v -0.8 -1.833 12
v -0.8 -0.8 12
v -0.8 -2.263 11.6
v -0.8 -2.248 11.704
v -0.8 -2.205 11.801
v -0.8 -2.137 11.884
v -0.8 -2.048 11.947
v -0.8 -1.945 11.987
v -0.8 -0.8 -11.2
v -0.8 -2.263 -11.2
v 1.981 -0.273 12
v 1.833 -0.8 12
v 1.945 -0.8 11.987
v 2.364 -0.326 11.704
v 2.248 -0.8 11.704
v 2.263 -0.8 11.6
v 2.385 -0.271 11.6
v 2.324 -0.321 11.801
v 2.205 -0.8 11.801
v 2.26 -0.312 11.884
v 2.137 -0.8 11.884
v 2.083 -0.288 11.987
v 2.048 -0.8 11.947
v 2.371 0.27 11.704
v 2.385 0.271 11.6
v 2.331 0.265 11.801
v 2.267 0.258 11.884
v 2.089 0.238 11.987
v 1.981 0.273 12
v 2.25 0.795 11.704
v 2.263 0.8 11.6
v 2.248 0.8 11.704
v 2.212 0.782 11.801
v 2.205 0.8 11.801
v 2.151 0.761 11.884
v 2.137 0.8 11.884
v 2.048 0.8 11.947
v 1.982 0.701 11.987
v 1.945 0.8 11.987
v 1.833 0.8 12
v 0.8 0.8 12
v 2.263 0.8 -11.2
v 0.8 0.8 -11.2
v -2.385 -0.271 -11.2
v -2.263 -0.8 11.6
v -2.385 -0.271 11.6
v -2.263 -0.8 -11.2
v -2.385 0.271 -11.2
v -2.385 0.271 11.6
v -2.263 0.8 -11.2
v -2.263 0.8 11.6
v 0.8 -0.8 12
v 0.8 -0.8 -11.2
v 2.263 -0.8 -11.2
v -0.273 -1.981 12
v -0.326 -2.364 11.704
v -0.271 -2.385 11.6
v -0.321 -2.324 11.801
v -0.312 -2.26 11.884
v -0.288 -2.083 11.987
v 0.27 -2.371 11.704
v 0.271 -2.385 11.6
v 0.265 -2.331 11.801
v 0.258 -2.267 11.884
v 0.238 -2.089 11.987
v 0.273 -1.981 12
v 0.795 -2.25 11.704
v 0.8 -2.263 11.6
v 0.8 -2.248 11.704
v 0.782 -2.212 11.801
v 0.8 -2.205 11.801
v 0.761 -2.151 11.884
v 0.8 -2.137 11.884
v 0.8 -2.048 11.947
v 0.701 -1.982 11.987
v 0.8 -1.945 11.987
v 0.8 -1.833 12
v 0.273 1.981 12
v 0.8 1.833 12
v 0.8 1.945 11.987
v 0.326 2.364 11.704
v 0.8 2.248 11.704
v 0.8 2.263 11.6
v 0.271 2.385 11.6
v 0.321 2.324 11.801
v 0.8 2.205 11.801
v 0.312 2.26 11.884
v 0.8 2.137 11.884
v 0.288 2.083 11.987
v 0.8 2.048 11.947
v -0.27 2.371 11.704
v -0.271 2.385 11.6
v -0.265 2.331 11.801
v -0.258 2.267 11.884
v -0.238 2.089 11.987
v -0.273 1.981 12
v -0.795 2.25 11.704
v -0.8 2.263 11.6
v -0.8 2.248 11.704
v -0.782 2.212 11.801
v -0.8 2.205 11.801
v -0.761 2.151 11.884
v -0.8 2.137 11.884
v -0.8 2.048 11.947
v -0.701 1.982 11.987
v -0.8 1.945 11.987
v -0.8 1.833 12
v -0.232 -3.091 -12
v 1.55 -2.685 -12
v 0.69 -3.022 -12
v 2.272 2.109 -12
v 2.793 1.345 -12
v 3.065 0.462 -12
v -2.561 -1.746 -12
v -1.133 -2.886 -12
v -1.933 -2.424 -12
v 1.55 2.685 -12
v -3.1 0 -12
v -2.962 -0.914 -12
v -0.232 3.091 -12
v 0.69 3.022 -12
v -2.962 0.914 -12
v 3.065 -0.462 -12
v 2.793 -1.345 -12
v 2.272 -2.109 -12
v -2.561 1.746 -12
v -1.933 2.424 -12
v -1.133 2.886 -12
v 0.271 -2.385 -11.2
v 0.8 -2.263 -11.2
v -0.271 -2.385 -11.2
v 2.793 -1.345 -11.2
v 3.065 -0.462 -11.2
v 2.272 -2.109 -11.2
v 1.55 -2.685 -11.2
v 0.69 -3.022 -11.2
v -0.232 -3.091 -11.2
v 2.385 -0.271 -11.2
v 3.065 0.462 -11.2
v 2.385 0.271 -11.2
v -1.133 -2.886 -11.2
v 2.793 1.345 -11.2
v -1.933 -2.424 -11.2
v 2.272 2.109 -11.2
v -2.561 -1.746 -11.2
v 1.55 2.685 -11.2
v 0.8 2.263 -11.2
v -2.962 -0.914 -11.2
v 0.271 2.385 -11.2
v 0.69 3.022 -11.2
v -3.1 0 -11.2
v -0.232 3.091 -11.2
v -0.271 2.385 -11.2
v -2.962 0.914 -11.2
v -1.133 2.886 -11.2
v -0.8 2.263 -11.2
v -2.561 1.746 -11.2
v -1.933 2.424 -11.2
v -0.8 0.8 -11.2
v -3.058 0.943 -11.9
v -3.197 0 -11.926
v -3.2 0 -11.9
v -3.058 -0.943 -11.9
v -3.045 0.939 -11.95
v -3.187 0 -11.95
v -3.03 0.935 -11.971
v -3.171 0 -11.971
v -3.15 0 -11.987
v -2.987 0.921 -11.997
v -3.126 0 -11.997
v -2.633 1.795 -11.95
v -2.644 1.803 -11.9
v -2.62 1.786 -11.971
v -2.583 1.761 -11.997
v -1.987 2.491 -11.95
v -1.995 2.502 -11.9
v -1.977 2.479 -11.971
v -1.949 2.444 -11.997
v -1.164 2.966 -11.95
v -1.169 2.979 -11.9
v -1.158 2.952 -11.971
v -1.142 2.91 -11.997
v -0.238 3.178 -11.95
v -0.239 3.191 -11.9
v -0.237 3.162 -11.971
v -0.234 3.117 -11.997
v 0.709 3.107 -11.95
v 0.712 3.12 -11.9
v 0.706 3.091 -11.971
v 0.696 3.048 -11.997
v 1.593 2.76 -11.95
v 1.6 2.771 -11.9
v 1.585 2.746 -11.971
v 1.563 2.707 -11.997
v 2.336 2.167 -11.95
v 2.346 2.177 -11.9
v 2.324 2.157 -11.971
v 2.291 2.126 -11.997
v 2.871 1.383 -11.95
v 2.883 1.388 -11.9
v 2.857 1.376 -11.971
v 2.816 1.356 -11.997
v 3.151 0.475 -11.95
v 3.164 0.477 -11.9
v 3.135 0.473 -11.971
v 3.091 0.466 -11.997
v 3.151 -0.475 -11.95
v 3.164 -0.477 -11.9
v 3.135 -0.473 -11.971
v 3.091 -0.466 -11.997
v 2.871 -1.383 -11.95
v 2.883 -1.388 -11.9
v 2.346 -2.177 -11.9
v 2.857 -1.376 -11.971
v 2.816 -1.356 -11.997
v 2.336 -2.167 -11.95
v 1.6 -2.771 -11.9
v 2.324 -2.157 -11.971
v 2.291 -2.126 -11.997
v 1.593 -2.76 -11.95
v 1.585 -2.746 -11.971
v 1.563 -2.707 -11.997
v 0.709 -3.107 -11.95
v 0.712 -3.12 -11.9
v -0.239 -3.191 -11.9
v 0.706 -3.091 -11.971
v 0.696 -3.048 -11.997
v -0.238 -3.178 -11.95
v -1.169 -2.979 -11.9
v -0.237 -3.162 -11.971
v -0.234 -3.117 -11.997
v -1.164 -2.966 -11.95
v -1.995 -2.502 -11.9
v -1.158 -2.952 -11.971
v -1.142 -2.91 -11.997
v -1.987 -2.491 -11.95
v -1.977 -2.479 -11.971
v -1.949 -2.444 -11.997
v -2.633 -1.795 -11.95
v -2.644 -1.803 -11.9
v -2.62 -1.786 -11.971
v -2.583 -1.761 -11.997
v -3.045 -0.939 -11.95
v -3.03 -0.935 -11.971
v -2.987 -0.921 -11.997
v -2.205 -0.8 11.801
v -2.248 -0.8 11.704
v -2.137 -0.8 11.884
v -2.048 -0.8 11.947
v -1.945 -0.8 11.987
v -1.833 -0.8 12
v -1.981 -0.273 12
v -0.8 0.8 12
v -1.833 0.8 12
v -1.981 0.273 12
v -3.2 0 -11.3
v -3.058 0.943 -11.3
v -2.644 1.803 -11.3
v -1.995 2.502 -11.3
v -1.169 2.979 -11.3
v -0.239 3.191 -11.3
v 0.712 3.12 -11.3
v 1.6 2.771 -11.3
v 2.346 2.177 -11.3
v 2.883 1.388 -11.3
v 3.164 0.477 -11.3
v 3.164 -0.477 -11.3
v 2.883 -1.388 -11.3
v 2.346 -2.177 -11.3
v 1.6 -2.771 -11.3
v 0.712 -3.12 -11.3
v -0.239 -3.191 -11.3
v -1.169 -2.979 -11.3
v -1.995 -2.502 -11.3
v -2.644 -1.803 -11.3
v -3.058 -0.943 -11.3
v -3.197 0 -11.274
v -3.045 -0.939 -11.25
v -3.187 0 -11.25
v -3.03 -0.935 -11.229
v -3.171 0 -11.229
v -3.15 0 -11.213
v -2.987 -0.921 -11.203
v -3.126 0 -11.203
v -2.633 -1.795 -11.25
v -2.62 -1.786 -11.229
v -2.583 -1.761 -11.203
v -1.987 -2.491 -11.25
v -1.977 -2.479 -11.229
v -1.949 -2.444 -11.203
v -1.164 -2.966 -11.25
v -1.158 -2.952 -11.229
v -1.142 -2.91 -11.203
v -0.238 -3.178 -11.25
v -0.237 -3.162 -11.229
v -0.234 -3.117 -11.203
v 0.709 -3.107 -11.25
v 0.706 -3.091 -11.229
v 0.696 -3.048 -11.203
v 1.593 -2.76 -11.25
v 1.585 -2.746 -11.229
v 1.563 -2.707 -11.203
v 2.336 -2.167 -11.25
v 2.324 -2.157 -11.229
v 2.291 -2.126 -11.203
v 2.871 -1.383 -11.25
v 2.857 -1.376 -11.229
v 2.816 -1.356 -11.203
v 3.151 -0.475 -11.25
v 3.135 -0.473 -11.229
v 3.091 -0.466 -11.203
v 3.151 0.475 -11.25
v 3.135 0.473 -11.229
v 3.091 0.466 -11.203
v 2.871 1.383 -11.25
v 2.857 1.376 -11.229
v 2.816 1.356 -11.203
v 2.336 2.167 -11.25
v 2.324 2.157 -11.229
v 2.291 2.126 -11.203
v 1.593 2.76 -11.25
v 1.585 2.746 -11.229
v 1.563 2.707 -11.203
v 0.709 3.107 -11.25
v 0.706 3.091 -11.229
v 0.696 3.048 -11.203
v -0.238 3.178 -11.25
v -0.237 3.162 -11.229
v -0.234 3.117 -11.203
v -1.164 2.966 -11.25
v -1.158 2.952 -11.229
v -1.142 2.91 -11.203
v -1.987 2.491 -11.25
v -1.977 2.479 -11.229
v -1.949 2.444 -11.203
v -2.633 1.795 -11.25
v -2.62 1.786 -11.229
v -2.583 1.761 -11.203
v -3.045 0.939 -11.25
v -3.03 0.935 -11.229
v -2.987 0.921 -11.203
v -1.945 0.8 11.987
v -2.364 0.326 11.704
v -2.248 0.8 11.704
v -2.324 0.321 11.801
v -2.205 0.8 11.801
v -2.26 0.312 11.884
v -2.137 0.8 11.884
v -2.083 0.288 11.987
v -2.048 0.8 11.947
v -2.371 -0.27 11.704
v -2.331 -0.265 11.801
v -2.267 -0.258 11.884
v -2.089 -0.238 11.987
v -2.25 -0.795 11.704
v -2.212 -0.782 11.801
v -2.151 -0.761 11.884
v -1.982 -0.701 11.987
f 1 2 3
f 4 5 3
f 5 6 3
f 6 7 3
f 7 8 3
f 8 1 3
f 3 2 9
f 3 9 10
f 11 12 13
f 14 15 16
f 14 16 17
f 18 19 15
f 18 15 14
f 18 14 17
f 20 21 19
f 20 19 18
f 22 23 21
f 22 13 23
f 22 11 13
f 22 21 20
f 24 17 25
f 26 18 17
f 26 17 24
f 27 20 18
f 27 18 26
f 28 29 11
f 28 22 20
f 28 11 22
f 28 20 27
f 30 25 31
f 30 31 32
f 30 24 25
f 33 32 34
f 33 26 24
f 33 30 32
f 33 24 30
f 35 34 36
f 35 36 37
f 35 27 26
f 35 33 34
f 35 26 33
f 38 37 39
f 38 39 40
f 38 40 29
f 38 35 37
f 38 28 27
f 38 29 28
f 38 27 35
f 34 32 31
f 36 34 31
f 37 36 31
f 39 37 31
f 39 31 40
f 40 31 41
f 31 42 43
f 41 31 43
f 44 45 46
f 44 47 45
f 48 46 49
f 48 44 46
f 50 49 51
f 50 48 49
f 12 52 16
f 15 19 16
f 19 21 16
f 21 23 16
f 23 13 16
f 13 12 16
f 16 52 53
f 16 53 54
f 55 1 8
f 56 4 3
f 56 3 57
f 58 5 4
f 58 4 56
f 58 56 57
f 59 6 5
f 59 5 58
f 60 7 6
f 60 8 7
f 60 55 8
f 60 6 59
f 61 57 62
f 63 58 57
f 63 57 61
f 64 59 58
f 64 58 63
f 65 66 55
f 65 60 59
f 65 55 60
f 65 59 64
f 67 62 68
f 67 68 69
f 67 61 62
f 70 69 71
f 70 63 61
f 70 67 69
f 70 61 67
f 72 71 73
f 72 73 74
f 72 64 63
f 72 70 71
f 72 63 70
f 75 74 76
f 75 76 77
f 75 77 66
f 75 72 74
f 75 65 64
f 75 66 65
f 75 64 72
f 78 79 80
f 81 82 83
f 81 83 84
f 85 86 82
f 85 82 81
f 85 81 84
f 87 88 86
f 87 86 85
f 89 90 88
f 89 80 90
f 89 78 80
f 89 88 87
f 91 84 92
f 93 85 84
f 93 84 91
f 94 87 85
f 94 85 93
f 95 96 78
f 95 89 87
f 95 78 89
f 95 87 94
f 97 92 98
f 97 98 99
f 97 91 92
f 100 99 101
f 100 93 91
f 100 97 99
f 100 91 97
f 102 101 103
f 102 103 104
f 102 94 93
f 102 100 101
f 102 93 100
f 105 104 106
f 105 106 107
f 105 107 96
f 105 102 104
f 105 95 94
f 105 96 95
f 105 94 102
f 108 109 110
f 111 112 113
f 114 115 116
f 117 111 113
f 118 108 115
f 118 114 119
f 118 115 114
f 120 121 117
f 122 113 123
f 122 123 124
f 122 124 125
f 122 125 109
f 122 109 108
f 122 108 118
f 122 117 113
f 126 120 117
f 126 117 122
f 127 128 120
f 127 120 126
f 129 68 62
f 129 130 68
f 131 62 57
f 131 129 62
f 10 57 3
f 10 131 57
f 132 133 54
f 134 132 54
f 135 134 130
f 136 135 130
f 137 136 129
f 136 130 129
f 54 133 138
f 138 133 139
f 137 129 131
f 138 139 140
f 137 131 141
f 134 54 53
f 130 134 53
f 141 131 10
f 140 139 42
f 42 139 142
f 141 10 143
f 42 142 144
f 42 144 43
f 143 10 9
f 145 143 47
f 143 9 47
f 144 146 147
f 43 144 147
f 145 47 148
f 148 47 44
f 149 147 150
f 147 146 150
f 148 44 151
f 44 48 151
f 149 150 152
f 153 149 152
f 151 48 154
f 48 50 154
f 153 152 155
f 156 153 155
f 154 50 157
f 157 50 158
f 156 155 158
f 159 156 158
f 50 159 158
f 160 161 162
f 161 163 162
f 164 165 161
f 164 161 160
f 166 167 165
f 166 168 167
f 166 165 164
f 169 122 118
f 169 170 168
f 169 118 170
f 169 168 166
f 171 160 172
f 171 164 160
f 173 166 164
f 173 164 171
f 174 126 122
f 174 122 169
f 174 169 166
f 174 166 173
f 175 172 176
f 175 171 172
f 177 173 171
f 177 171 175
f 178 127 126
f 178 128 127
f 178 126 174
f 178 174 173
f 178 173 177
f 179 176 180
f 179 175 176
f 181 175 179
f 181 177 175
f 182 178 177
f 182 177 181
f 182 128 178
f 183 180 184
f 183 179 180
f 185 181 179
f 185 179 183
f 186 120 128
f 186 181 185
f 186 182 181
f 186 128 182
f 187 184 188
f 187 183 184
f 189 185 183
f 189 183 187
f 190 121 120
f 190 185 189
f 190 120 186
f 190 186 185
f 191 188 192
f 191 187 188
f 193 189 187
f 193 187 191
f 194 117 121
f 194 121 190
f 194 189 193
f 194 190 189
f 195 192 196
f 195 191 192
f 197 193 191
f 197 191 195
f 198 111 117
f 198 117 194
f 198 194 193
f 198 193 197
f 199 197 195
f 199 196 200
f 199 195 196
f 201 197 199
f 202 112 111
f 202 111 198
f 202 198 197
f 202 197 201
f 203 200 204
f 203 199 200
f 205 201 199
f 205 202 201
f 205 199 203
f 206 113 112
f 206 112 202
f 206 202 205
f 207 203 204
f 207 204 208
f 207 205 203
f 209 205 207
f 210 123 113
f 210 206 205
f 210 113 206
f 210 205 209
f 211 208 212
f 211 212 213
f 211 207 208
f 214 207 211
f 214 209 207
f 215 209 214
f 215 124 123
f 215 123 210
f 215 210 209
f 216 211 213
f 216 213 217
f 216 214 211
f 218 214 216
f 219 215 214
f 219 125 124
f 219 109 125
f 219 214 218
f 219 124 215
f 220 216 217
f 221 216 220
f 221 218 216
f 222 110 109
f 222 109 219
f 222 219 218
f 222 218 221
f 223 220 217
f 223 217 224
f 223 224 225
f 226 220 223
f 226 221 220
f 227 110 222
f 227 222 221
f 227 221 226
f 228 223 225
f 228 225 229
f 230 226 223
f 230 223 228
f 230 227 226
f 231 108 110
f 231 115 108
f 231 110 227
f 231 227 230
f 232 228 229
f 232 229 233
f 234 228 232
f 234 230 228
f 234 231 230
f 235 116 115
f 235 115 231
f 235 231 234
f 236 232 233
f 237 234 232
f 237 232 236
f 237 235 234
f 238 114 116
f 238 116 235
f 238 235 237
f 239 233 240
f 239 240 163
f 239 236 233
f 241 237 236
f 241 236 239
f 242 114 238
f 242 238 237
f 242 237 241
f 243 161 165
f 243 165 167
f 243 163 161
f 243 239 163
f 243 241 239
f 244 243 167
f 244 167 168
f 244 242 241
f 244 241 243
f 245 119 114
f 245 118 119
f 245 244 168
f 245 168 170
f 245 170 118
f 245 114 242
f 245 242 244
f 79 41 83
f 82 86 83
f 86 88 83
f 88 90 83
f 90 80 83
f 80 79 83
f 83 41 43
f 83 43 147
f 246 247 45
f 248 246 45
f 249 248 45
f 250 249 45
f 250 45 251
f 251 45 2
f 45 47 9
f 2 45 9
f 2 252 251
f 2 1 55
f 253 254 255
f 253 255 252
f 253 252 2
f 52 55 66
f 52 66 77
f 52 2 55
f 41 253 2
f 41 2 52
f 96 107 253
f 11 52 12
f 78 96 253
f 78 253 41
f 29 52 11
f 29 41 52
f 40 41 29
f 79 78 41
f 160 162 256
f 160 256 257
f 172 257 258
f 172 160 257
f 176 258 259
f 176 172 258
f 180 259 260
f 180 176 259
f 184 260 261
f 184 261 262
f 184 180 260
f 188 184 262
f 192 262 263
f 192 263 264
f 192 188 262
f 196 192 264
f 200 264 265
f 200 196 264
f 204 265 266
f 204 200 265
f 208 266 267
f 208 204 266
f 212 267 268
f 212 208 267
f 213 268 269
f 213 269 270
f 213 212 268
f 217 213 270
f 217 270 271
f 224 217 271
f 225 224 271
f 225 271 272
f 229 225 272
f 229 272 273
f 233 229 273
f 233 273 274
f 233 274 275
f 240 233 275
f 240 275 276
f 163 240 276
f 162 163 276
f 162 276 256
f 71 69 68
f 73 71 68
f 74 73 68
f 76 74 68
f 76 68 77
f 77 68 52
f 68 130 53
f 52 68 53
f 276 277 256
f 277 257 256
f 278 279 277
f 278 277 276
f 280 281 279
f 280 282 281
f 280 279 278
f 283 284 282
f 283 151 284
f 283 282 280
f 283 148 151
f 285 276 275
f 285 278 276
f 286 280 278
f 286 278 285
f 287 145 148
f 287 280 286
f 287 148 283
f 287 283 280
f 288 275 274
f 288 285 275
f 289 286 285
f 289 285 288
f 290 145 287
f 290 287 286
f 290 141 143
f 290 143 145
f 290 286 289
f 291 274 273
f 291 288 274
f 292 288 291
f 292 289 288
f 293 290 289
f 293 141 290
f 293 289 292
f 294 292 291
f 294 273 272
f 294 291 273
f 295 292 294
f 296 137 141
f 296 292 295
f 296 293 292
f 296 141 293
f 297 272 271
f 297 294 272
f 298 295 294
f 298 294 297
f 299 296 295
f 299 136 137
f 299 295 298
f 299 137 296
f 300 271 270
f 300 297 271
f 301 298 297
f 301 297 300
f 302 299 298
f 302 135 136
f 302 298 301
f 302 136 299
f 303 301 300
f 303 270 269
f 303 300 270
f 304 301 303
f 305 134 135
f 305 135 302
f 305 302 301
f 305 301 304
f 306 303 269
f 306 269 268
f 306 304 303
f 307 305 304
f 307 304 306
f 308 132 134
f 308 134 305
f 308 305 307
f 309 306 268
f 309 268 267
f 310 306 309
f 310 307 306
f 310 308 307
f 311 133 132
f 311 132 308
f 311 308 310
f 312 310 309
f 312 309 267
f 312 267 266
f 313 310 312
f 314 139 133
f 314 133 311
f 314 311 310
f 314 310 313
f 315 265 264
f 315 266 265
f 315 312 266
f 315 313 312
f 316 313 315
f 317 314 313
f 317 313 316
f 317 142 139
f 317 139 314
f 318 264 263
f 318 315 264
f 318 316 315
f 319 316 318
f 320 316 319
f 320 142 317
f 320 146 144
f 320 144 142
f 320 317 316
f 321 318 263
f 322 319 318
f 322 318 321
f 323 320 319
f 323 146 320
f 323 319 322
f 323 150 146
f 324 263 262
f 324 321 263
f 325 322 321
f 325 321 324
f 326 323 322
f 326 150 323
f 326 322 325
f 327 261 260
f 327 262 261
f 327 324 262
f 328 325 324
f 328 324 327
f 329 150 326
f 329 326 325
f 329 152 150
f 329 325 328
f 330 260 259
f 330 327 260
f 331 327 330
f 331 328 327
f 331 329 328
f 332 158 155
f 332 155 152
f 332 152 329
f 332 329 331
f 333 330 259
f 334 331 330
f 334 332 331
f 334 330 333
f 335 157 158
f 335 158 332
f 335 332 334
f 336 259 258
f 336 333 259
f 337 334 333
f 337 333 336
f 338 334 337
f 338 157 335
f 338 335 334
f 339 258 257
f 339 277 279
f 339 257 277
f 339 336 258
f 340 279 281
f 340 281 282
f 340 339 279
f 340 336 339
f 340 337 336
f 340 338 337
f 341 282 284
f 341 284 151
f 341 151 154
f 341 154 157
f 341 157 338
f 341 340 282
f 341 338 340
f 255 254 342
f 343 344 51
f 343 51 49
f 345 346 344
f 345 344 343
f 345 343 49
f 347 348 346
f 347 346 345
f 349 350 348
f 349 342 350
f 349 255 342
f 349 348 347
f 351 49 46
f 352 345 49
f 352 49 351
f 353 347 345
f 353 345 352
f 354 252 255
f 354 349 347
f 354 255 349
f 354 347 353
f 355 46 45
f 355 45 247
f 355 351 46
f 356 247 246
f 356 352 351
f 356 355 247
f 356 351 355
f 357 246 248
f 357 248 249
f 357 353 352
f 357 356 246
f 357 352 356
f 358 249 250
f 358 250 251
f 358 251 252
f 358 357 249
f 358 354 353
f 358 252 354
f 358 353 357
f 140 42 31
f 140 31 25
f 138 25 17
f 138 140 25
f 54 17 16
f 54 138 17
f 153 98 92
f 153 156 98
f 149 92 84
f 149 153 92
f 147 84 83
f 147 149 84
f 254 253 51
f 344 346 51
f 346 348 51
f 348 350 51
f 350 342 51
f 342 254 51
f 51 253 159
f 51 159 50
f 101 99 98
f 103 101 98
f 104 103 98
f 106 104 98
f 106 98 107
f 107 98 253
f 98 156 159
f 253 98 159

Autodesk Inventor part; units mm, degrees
ref_plane "YZ Plane" through (0, 0, 0) normal (1, 0, 0) x (0, 1, 0)
ref_plane "XZ Plane" through (0, 0, 0) normal (0, 1, 0) x (-1, 0, 0)
ref_plane "XY Plane" through (0, 0, 0) normal (0, 0, 1) x (1, 0, 0)
sketch "Sketch1" plane through (0, 0, 0) normal (0, 0, 1) x (1, 0, 0)
  circle A0 centre (0, 0) radius 2.4 construction
  line L0 (-0.8, 2.2627) -> (-0.8, 0.8)
  line L1 (-0.8, 0.8) -> (-2.2627, 0.8)
  line L2 (-2.2627, -0.8) -> (-0.8, -0.8)
  line L3 (-0.8, -0.8) -> (-0.8, -2.2627)
  line L4 (0.8, -2.2627) -> (0.8, -0.8)
  line L5 (0.8, -0.8) -> (2.2627, -0.8)
  line L6 (2.2627, 0.8) -> (0.8, 0.8)
  line L7 (0.8, 0.8) -> (0.8, 2.2627)
  arc A1 (0.8, 2.2627) -> (-0.8, 2.2627) centre (0, 0) ccw
  arc A2 (-2.2627, 0.8) -> (-2.2627, -0.8) centre (0, 0) ccw
  arc A3 (-0.8, -2.2627) -> (0.8, -2.2627) centre (0, 0) ccw
  arc A4 (2.2627, -0.8) -> (2.2627, 0.8) centre (0, 0) ccw
  dimension "d0" = 4.8
  dimension "d1" = 1.6
extrude "Extrusion1" add sketch "Sketch1" along normal mid plane 24
sketch "Sketch2" plane through (0, 0, -12) normal (0, 0, -1) x (-1, 0, 0)
  line L0 (0.8, 0.8) -> (0.8, 2.2627) projected
  arc A0 (0.8, 2.2627) -> (-0.8, 2.2627) centre (0, 0) ccw projected
  line L1 (-0.8, 2.2627) -> (-0.8, 0.8) projected
  line L2 (-0.8, 0.8) -> (-2.2627, 0.8) projected
  arc A1 (-2.2627, 0.8) -> (-2.2627, -0.8) centre (0, 0) ccw projected
  line L3 (-2.2627, -0.8) -> (-0.8, -0.8) projected
  line L4 (-0.8, -0.8) -> (-0.8, -2.2627) projected
  arc A2 (-0.8, -2.2627) -> (0.8, -2.2627) centre (0, 0) ccw projected
  line L5 (0.8, -2.2627) -> (0.8, -0.8) projected
  line L6 (0.8, -0.8) -> (2.2627, -0.8) projected
  arc A3 (2.2627, -0.8) -> (2.2627, 0.8) centre (0, 0) ccw projected
  line L7 (2.2627, 0.8) -> (0.8, 0.8) projected
  circle A4 centre (0, 0) radius 3.2
  dimension "d7" = 6.4
extrude "Extrusion2" add sketch "Sketch2" against normal blind 0.8
fillet "Fillet1" radius 0.4 4 edges at (0, 2.4, 12) (-2.4, 0, 12) (0, -2.4, 12) (2.4, 0, 12)
fillet "Fillet1" radius 0.1 2 edges at (3.2, 0, -11.2) (3.2, 0, -12)
equation "\"d0\" = kd"
equation "\"d1\" = axlet"
equation "\"d2\" = 3 * lu"
equation "\"d7\" = tsd"
equation "\"d8\" = tsl"
equation "\"d4\" = tf"
equation "\"d10\" = lf"
equation "\"kd\" = 4.8"
equation "\"axlet\" = 1.6"
equation "\"lu\" = 8"
equation "\"tsd\" = 6.4"
equation "\"tsl\" = 0.8"
equation "\"tf\" = 0.4"
equation "\"lf\" = 0.1"
properties part number "24316-ReddishBrown" material "ABS Plastic"
